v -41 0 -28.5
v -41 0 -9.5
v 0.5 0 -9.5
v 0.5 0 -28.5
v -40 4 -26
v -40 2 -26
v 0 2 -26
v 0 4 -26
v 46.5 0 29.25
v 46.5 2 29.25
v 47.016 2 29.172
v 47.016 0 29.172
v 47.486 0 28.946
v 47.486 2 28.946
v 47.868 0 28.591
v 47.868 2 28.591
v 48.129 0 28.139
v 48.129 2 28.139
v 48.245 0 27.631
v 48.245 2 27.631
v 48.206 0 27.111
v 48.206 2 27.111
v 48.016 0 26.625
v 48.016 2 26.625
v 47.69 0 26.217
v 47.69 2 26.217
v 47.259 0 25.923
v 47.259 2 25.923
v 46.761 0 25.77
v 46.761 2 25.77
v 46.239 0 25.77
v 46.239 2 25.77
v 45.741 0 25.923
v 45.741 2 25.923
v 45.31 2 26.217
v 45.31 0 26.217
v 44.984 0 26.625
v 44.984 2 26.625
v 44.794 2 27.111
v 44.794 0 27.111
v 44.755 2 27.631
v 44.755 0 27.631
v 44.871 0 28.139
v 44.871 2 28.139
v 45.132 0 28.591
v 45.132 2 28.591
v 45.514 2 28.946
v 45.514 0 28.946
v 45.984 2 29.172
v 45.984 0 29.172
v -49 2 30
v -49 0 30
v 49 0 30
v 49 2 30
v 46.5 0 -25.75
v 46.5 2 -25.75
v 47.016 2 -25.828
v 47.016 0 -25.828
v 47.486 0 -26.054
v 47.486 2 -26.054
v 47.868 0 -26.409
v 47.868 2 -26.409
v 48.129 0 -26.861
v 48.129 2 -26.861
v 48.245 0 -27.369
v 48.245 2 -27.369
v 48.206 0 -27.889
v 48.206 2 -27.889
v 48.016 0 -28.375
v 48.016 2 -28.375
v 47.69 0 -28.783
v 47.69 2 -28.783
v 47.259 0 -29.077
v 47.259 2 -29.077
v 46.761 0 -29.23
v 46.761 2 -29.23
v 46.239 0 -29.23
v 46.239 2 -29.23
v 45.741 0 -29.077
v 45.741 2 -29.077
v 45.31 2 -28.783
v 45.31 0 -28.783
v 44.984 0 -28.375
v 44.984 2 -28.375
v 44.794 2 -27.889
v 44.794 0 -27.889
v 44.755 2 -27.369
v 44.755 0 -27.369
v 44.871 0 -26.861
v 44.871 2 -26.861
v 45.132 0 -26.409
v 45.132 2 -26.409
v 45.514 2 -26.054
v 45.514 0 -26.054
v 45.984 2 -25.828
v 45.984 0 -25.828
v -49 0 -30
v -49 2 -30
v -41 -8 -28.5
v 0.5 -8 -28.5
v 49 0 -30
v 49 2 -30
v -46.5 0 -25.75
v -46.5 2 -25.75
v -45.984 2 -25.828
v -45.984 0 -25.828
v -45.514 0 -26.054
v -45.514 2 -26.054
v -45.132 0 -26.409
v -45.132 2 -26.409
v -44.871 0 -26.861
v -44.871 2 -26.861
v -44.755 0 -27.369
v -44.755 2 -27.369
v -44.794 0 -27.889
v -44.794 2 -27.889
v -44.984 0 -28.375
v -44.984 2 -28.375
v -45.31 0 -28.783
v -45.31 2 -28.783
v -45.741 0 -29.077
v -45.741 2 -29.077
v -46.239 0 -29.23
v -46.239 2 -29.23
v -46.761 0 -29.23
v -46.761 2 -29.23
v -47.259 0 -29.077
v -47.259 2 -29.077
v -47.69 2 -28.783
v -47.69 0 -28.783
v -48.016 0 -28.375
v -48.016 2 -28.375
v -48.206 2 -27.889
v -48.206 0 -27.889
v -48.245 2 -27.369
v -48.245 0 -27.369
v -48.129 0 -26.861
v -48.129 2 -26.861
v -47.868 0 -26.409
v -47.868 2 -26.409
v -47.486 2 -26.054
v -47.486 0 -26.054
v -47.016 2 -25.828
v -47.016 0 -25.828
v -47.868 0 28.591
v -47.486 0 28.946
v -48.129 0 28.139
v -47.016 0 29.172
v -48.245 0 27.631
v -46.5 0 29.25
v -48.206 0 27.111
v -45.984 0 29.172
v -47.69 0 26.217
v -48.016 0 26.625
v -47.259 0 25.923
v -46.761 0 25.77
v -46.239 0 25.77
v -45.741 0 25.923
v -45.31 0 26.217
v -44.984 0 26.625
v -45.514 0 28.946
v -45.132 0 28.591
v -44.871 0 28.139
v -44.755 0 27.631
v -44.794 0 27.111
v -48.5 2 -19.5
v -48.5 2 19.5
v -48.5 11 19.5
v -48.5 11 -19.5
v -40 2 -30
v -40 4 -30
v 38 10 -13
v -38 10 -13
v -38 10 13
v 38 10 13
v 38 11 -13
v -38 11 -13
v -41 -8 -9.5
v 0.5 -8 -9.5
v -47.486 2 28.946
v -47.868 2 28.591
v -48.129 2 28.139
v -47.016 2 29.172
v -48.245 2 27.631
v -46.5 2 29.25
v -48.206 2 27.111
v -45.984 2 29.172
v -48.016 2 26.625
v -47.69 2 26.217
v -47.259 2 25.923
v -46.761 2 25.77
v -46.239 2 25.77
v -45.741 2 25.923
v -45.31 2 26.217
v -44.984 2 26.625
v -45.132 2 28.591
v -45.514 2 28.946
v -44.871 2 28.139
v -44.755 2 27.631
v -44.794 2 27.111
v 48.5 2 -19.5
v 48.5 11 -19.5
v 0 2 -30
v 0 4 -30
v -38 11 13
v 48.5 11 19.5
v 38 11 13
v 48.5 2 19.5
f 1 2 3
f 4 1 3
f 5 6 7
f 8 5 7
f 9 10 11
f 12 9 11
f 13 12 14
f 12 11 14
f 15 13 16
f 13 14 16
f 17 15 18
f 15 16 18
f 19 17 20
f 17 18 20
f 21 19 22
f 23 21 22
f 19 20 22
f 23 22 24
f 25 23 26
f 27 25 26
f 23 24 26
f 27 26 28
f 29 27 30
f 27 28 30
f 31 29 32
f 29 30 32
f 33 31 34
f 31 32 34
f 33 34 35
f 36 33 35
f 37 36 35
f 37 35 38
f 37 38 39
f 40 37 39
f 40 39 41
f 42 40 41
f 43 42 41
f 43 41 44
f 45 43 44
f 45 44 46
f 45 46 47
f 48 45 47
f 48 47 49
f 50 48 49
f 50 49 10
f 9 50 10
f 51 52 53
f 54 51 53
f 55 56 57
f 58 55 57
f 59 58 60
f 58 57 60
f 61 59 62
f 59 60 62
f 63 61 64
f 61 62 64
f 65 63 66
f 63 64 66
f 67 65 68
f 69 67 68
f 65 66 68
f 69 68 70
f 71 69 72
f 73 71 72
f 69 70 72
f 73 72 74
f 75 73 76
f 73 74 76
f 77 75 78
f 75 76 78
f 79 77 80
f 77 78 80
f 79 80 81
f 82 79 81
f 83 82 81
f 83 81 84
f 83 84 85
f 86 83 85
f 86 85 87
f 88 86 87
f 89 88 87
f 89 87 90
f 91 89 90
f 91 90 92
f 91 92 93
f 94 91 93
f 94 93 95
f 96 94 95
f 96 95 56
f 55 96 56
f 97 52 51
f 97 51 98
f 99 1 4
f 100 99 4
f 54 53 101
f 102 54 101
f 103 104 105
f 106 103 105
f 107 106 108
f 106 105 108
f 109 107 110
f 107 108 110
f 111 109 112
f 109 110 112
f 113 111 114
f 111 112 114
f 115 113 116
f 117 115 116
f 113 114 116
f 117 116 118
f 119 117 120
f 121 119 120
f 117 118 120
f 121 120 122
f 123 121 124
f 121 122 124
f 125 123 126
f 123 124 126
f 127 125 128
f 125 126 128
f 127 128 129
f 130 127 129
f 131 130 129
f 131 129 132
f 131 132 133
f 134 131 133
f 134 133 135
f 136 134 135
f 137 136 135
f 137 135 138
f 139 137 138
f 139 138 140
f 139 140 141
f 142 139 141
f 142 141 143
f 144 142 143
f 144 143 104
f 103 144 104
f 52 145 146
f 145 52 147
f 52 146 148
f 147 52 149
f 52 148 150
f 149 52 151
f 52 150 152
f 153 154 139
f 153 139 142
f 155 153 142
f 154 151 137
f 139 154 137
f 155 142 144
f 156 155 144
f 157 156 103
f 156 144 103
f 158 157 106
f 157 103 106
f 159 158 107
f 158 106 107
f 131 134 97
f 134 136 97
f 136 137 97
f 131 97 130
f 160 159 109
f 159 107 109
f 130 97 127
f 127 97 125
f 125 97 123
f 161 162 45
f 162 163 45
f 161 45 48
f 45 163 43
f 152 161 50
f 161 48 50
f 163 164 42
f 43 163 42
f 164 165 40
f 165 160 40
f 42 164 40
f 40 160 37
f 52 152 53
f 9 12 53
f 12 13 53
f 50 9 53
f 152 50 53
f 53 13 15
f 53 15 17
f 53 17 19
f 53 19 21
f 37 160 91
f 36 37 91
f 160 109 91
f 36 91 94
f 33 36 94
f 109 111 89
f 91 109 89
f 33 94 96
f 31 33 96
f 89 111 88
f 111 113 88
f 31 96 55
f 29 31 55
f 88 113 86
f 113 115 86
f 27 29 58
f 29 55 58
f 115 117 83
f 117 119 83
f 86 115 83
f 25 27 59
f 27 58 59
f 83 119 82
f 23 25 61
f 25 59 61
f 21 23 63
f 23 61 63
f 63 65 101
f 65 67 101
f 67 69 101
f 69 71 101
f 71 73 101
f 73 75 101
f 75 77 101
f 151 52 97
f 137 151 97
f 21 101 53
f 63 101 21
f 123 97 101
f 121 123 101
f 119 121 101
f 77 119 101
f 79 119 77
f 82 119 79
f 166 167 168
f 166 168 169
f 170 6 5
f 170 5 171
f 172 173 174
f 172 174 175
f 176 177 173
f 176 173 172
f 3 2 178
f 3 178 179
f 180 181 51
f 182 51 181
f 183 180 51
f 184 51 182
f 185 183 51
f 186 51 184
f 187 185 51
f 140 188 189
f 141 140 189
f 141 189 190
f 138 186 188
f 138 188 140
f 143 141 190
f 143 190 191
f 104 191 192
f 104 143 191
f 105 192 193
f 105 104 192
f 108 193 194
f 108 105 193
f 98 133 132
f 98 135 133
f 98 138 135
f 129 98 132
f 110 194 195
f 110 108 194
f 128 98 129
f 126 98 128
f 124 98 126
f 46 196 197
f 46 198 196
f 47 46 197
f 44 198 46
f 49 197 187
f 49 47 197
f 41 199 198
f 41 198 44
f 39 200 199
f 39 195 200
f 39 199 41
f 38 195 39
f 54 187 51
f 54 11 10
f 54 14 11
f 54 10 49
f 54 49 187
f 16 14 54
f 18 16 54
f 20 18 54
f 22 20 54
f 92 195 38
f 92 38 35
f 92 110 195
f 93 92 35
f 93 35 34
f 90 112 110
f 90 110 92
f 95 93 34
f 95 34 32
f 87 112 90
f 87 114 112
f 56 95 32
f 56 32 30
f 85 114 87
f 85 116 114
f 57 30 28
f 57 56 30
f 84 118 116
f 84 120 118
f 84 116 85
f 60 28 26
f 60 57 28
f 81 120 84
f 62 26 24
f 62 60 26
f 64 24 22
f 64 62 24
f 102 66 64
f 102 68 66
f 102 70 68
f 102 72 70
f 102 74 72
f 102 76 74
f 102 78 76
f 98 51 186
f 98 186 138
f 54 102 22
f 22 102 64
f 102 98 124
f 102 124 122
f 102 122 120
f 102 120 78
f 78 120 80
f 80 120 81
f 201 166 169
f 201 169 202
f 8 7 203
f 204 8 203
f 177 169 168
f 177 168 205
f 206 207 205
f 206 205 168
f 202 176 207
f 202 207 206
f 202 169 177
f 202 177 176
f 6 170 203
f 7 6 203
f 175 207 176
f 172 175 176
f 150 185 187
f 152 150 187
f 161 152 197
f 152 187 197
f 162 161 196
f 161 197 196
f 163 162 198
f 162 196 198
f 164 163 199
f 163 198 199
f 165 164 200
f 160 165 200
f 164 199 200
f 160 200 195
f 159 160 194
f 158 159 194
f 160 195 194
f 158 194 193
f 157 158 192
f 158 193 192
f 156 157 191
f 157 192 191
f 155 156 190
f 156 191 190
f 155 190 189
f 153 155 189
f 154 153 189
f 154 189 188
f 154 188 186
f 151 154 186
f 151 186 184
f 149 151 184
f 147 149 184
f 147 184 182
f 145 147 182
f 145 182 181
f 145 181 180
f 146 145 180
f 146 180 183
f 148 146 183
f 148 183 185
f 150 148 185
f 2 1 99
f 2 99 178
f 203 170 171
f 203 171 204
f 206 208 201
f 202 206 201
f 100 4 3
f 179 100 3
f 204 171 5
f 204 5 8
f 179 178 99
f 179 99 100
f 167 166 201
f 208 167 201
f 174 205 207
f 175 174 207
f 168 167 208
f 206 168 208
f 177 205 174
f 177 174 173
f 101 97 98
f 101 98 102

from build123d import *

# Parameters (mm, degrees)
SKETCH1_W           = 98
SKETCH1_H           = 60
BOSS_EXTRUDE1_DEPTH = 2
SKETCH2_W           = 97
SKETCH2_H           = 39
BOSS_EXTRUDE2_DEPTH = 9
SKETCH3_W           = 76
SKETCH3_H           = 26
CUT_EXTRUDE1_DEPTH  = 1
SKETCH4_W           = 41.5
SKETCH4_H           = 19
BOSS_EXTRUDE3_DEPTH = 8
SKETCH5_R           = 1.75
CUT_EXTRUDE2_DEPTH  = 59.318093247
SKETCH6_W           = 40
SKETCH6_H           = 4
BOSS_EXTRUDE4_DEPTH = 2


with BuildPart() as part:
    # Sketch1 → Boss-Extrude1 (new body)
    with BuildSketch(Plane(origin=(0, 0, 0), x_dir=(1, 0, 0), z_dir=(0, 1, 0))):
        Rectangle(SKETCH1_W, SKETCH1_H)
    extrude(amount=BOSS_EXTRUDE1_DEPTH)

    # Sketch5 → Cut-Extrude2 (cut, through all)
    with BuildSketch(Plane(origin=(0, 2, 0), x_dir=(1, 0, 0), z_dir=(0, 1, 0))):
        with Locations(Location((-46.5, 27.5, 0), (0, 0, 270))):
            Circle(SKETCH5_R)
        with Locations(Location((46.5, 27.5, 0), (0, 0, 270))):
            Circle(SKETCH5_R)
        with Locations(Location((46.5, -27.5, 0), (0, 0, 270))):
            Circle(SKETCH5_R)
        with Locations(Location((-46.5, -27.5, 0), (0, 0, 270))):
            Circle(SKETCH5_R)
    extrude(amount=-CUT_EXTRUDE2_DEPTH, mode=Mode.SUBTRACT)


with BuildPart() as body_2:
    # Sketch2 → Boss-Extrude2 (new body)
    with BuildSketch(Plane(origin=(0, 2, 0), x_dir=(1, 0, 0), z_dir=(0, 1, 0))):
        Rectangle(SKETCH2_W, SKETCH2_H)
    extrude(amount=BOSS_EXTRUDE2_DEPTH)

    # Sketch3 → Cut-Extrude1 (cut)
    with BuildSketch(Plane(origin=(0, 11, 0), x_dir=(1, 0, 0), z_dir=(0, 1, 0))):
        Rectangle(SKETCH3_W, SKETCH3_H)
    extrude(amount=-CUT_EXTRUDE1_DEPTH, mode=Mode.SUBTRACT)


with BuildPart() as body_3:
    # Sketch4 → Boss-Extrude3 (new body)
    with BuildSketch(Plane.XZ):
        with Locations((-20.25, -19)):
            Rectangle(SKETCH4_W, SKETCH4_H)
    extrude(amount=BOSS_EXTRUDE3_DEPTH)


with BuildPart() as body_4:
    # Sketch6 → Boss-Extrude4 (new body)
    with BuildSketch(Plane(origin=(0, 2, 0), x_dir=(1, 0, 0), z_dir=(0, 1, 0))):
        with Locations((-20, 28)):
            Rectangle(SKETCH6_W, SKETCH6_H)
    extrude(amount=BOSS_EXTRUDE4_DEPTH)


solid = Compound([part.part, body_2.part, body_3.part, body_4.part])
